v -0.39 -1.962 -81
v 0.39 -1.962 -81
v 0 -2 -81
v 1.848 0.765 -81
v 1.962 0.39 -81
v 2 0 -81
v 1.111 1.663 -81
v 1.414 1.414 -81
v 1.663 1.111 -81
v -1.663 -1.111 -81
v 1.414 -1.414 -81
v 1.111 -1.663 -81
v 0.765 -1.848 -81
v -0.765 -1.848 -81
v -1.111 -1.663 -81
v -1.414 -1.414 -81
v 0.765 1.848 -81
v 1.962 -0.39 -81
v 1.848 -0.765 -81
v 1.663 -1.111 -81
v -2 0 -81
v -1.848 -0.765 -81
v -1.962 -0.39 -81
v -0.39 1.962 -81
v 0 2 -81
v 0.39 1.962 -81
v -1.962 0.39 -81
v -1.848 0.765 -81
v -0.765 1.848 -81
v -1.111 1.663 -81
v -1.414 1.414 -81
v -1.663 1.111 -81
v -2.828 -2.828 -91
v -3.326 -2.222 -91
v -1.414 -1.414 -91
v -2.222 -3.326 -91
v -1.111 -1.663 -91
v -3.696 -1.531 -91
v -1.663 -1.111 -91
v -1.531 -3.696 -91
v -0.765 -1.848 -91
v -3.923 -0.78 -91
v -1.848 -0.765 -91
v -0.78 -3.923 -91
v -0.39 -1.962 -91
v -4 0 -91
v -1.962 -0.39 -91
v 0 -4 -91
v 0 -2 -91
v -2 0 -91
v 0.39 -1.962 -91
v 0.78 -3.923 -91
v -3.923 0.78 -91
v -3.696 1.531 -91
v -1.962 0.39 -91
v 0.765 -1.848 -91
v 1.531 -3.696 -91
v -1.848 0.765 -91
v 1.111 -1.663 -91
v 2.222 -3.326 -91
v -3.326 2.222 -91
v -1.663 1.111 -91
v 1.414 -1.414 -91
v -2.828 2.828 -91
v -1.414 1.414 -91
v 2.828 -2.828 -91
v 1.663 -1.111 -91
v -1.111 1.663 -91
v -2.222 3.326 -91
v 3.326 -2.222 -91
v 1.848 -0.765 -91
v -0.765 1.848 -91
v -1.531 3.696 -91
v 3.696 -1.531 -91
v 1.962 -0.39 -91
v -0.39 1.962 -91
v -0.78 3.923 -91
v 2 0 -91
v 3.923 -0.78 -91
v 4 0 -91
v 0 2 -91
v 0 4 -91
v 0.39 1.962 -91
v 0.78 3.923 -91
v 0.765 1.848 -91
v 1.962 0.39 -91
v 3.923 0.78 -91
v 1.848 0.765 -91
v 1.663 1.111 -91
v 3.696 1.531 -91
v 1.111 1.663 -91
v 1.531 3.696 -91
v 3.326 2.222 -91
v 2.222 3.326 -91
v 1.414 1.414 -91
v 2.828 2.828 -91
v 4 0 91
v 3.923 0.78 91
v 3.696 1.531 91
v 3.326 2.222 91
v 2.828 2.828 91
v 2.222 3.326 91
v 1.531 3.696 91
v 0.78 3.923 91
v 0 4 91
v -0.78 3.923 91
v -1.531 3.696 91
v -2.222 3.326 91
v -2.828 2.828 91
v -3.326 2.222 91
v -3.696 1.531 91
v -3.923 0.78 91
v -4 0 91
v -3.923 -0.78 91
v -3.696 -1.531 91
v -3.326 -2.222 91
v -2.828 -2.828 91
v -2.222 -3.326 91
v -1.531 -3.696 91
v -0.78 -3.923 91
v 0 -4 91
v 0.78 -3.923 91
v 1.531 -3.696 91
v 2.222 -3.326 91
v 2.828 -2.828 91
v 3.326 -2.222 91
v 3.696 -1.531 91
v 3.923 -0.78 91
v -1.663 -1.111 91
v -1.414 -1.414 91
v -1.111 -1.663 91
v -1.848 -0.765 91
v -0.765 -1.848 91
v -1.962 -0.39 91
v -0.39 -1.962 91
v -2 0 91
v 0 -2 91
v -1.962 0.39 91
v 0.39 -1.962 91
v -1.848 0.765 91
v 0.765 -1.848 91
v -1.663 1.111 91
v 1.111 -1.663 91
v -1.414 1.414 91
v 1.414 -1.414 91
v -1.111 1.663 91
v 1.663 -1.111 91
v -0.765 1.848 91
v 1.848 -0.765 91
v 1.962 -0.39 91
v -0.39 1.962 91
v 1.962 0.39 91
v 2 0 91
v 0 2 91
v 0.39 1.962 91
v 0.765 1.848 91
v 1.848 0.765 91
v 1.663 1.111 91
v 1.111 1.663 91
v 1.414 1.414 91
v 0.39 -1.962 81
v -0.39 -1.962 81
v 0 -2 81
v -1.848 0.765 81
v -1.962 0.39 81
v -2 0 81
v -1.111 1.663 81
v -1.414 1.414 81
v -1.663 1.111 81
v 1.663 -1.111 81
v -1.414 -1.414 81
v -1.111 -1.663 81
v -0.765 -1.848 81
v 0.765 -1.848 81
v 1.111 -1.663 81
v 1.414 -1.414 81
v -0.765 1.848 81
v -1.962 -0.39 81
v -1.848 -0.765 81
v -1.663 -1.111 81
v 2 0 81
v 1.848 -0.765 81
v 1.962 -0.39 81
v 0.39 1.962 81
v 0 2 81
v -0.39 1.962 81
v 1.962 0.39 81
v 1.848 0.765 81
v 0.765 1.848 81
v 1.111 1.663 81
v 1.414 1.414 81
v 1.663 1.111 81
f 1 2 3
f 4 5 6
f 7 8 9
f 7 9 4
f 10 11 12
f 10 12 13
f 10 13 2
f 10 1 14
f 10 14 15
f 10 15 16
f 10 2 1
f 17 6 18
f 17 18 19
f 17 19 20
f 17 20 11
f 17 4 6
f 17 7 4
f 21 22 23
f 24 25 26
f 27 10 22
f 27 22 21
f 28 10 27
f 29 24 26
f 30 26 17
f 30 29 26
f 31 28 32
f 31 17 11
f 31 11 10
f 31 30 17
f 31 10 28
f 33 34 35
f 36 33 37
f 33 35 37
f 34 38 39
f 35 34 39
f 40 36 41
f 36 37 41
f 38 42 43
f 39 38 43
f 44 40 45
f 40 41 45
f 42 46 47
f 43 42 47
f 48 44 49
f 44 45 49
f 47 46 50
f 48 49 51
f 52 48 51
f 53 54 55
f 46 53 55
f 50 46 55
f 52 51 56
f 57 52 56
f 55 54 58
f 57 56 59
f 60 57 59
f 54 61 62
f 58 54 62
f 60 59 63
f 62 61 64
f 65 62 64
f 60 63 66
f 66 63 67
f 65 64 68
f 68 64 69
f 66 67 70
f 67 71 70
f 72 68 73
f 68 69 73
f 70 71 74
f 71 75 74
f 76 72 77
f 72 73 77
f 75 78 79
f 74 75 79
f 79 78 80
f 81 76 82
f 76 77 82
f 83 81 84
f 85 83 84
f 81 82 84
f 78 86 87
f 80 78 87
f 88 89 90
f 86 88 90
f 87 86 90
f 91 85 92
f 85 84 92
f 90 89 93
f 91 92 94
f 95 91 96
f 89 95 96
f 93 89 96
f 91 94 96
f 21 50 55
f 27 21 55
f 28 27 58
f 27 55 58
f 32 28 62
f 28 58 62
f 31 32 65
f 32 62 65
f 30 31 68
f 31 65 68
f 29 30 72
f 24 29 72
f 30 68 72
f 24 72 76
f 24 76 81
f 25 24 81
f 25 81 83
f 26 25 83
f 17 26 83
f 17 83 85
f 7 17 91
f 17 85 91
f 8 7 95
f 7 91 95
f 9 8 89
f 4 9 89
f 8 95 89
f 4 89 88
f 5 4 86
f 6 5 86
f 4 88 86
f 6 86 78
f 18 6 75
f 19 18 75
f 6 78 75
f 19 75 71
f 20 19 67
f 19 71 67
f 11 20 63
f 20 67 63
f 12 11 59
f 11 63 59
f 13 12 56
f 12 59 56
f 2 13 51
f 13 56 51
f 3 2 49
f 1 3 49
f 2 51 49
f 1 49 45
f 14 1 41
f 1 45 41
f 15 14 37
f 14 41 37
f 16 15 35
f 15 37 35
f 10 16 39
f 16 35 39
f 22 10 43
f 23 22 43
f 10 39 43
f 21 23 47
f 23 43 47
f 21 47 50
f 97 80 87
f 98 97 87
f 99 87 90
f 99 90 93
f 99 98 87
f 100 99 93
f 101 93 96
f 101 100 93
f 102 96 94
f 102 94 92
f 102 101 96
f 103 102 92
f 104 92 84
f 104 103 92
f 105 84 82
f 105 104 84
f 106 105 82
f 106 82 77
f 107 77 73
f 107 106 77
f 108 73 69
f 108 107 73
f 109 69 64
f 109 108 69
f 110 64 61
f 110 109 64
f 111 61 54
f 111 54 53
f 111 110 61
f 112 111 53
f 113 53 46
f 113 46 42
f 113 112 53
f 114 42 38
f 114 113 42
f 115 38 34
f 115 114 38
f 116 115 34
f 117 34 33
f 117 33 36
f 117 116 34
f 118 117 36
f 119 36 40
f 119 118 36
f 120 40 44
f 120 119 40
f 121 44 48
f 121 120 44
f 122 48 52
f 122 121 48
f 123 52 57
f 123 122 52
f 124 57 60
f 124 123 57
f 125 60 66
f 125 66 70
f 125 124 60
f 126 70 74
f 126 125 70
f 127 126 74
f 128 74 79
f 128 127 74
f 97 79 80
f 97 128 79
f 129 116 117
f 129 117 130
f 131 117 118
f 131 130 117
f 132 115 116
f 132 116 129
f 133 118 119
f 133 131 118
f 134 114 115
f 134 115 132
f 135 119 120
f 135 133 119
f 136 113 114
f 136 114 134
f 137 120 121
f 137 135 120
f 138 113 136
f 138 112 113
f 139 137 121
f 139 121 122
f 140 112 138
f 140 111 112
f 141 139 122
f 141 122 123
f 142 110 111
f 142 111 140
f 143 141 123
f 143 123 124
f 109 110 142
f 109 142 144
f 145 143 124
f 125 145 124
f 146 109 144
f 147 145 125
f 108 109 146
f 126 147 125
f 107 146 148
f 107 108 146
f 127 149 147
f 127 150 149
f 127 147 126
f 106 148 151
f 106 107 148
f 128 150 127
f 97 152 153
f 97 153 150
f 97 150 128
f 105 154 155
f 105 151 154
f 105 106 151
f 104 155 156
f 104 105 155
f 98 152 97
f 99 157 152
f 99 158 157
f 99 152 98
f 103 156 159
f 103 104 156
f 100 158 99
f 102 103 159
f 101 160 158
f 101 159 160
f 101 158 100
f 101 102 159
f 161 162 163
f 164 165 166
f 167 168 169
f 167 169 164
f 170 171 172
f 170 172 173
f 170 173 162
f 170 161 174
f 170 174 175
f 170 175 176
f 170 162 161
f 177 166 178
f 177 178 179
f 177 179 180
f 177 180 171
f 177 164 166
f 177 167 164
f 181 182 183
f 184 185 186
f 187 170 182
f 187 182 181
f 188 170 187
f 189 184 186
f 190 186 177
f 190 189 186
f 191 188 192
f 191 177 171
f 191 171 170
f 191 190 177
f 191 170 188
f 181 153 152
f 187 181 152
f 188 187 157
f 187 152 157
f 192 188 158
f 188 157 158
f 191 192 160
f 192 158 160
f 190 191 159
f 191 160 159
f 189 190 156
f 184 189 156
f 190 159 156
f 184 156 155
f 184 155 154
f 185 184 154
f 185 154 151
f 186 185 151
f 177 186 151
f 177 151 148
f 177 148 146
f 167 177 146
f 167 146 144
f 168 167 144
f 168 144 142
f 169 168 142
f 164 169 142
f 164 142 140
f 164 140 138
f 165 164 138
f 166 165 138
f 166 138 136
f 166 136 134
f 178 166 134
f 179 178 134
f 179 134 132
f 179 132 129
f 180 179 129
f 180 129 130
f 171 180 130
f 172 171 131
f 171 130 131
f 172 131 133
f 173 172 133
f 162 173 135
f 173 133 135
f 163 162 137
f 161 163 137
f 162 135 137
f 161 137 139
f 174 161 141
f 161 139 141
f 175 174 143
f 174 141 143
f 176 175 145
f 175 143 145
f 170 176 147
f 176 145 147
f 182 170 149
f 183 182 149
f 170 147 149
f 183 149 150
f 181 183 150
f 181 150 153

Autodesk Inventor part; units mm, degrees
ref_plane "YZ Plane" through (0, 0, 0) normal (1, 0, 0) x (0, 1, 0)
ref_plane "XZ Plane" through (0, 0, 0) normal (0, 1, 0) x (-1, 0, 0)
ref_plane "XY Plane" through (0, 0, 0) normal (0, 0, 1) x (1, 0, 0)
sketch "スケッチ1" plane through (0, 0, 0) normal (0, 0, 1) x (1, 0, 0)
  circle A0 centre (0, 0) radius 2
  circle A1 centre (0, 0) radius 4
  dimension "d0" = 4
  dimension "d1" = 8
extrude "押し出し1" add sketch "スケッチ1" along normal mid plane 182 contours A0 | A1
sketch "スケッチ3" plane through (0, 0, 91) normal (0, 0, 1) x (1, 0, 0)
  circle A0 centre (0, 0) radius 2
  dimension "d5" = 4
extrude "押し出し2" cut sketch "スケッチ3" against normal blind 10
sketch "スケッチ4" plane through (0, 0, -91) normal (0, 0, -1) x (-1, 0, 0)
  circle A0 centre (0, 0) radius 2
  dimension "d8" = 4
extrude "押し出し3" cut sketch "スケッチ4" against normal blind 10
properties part number "シャフト182mm" material "アルミニウム 7075"
